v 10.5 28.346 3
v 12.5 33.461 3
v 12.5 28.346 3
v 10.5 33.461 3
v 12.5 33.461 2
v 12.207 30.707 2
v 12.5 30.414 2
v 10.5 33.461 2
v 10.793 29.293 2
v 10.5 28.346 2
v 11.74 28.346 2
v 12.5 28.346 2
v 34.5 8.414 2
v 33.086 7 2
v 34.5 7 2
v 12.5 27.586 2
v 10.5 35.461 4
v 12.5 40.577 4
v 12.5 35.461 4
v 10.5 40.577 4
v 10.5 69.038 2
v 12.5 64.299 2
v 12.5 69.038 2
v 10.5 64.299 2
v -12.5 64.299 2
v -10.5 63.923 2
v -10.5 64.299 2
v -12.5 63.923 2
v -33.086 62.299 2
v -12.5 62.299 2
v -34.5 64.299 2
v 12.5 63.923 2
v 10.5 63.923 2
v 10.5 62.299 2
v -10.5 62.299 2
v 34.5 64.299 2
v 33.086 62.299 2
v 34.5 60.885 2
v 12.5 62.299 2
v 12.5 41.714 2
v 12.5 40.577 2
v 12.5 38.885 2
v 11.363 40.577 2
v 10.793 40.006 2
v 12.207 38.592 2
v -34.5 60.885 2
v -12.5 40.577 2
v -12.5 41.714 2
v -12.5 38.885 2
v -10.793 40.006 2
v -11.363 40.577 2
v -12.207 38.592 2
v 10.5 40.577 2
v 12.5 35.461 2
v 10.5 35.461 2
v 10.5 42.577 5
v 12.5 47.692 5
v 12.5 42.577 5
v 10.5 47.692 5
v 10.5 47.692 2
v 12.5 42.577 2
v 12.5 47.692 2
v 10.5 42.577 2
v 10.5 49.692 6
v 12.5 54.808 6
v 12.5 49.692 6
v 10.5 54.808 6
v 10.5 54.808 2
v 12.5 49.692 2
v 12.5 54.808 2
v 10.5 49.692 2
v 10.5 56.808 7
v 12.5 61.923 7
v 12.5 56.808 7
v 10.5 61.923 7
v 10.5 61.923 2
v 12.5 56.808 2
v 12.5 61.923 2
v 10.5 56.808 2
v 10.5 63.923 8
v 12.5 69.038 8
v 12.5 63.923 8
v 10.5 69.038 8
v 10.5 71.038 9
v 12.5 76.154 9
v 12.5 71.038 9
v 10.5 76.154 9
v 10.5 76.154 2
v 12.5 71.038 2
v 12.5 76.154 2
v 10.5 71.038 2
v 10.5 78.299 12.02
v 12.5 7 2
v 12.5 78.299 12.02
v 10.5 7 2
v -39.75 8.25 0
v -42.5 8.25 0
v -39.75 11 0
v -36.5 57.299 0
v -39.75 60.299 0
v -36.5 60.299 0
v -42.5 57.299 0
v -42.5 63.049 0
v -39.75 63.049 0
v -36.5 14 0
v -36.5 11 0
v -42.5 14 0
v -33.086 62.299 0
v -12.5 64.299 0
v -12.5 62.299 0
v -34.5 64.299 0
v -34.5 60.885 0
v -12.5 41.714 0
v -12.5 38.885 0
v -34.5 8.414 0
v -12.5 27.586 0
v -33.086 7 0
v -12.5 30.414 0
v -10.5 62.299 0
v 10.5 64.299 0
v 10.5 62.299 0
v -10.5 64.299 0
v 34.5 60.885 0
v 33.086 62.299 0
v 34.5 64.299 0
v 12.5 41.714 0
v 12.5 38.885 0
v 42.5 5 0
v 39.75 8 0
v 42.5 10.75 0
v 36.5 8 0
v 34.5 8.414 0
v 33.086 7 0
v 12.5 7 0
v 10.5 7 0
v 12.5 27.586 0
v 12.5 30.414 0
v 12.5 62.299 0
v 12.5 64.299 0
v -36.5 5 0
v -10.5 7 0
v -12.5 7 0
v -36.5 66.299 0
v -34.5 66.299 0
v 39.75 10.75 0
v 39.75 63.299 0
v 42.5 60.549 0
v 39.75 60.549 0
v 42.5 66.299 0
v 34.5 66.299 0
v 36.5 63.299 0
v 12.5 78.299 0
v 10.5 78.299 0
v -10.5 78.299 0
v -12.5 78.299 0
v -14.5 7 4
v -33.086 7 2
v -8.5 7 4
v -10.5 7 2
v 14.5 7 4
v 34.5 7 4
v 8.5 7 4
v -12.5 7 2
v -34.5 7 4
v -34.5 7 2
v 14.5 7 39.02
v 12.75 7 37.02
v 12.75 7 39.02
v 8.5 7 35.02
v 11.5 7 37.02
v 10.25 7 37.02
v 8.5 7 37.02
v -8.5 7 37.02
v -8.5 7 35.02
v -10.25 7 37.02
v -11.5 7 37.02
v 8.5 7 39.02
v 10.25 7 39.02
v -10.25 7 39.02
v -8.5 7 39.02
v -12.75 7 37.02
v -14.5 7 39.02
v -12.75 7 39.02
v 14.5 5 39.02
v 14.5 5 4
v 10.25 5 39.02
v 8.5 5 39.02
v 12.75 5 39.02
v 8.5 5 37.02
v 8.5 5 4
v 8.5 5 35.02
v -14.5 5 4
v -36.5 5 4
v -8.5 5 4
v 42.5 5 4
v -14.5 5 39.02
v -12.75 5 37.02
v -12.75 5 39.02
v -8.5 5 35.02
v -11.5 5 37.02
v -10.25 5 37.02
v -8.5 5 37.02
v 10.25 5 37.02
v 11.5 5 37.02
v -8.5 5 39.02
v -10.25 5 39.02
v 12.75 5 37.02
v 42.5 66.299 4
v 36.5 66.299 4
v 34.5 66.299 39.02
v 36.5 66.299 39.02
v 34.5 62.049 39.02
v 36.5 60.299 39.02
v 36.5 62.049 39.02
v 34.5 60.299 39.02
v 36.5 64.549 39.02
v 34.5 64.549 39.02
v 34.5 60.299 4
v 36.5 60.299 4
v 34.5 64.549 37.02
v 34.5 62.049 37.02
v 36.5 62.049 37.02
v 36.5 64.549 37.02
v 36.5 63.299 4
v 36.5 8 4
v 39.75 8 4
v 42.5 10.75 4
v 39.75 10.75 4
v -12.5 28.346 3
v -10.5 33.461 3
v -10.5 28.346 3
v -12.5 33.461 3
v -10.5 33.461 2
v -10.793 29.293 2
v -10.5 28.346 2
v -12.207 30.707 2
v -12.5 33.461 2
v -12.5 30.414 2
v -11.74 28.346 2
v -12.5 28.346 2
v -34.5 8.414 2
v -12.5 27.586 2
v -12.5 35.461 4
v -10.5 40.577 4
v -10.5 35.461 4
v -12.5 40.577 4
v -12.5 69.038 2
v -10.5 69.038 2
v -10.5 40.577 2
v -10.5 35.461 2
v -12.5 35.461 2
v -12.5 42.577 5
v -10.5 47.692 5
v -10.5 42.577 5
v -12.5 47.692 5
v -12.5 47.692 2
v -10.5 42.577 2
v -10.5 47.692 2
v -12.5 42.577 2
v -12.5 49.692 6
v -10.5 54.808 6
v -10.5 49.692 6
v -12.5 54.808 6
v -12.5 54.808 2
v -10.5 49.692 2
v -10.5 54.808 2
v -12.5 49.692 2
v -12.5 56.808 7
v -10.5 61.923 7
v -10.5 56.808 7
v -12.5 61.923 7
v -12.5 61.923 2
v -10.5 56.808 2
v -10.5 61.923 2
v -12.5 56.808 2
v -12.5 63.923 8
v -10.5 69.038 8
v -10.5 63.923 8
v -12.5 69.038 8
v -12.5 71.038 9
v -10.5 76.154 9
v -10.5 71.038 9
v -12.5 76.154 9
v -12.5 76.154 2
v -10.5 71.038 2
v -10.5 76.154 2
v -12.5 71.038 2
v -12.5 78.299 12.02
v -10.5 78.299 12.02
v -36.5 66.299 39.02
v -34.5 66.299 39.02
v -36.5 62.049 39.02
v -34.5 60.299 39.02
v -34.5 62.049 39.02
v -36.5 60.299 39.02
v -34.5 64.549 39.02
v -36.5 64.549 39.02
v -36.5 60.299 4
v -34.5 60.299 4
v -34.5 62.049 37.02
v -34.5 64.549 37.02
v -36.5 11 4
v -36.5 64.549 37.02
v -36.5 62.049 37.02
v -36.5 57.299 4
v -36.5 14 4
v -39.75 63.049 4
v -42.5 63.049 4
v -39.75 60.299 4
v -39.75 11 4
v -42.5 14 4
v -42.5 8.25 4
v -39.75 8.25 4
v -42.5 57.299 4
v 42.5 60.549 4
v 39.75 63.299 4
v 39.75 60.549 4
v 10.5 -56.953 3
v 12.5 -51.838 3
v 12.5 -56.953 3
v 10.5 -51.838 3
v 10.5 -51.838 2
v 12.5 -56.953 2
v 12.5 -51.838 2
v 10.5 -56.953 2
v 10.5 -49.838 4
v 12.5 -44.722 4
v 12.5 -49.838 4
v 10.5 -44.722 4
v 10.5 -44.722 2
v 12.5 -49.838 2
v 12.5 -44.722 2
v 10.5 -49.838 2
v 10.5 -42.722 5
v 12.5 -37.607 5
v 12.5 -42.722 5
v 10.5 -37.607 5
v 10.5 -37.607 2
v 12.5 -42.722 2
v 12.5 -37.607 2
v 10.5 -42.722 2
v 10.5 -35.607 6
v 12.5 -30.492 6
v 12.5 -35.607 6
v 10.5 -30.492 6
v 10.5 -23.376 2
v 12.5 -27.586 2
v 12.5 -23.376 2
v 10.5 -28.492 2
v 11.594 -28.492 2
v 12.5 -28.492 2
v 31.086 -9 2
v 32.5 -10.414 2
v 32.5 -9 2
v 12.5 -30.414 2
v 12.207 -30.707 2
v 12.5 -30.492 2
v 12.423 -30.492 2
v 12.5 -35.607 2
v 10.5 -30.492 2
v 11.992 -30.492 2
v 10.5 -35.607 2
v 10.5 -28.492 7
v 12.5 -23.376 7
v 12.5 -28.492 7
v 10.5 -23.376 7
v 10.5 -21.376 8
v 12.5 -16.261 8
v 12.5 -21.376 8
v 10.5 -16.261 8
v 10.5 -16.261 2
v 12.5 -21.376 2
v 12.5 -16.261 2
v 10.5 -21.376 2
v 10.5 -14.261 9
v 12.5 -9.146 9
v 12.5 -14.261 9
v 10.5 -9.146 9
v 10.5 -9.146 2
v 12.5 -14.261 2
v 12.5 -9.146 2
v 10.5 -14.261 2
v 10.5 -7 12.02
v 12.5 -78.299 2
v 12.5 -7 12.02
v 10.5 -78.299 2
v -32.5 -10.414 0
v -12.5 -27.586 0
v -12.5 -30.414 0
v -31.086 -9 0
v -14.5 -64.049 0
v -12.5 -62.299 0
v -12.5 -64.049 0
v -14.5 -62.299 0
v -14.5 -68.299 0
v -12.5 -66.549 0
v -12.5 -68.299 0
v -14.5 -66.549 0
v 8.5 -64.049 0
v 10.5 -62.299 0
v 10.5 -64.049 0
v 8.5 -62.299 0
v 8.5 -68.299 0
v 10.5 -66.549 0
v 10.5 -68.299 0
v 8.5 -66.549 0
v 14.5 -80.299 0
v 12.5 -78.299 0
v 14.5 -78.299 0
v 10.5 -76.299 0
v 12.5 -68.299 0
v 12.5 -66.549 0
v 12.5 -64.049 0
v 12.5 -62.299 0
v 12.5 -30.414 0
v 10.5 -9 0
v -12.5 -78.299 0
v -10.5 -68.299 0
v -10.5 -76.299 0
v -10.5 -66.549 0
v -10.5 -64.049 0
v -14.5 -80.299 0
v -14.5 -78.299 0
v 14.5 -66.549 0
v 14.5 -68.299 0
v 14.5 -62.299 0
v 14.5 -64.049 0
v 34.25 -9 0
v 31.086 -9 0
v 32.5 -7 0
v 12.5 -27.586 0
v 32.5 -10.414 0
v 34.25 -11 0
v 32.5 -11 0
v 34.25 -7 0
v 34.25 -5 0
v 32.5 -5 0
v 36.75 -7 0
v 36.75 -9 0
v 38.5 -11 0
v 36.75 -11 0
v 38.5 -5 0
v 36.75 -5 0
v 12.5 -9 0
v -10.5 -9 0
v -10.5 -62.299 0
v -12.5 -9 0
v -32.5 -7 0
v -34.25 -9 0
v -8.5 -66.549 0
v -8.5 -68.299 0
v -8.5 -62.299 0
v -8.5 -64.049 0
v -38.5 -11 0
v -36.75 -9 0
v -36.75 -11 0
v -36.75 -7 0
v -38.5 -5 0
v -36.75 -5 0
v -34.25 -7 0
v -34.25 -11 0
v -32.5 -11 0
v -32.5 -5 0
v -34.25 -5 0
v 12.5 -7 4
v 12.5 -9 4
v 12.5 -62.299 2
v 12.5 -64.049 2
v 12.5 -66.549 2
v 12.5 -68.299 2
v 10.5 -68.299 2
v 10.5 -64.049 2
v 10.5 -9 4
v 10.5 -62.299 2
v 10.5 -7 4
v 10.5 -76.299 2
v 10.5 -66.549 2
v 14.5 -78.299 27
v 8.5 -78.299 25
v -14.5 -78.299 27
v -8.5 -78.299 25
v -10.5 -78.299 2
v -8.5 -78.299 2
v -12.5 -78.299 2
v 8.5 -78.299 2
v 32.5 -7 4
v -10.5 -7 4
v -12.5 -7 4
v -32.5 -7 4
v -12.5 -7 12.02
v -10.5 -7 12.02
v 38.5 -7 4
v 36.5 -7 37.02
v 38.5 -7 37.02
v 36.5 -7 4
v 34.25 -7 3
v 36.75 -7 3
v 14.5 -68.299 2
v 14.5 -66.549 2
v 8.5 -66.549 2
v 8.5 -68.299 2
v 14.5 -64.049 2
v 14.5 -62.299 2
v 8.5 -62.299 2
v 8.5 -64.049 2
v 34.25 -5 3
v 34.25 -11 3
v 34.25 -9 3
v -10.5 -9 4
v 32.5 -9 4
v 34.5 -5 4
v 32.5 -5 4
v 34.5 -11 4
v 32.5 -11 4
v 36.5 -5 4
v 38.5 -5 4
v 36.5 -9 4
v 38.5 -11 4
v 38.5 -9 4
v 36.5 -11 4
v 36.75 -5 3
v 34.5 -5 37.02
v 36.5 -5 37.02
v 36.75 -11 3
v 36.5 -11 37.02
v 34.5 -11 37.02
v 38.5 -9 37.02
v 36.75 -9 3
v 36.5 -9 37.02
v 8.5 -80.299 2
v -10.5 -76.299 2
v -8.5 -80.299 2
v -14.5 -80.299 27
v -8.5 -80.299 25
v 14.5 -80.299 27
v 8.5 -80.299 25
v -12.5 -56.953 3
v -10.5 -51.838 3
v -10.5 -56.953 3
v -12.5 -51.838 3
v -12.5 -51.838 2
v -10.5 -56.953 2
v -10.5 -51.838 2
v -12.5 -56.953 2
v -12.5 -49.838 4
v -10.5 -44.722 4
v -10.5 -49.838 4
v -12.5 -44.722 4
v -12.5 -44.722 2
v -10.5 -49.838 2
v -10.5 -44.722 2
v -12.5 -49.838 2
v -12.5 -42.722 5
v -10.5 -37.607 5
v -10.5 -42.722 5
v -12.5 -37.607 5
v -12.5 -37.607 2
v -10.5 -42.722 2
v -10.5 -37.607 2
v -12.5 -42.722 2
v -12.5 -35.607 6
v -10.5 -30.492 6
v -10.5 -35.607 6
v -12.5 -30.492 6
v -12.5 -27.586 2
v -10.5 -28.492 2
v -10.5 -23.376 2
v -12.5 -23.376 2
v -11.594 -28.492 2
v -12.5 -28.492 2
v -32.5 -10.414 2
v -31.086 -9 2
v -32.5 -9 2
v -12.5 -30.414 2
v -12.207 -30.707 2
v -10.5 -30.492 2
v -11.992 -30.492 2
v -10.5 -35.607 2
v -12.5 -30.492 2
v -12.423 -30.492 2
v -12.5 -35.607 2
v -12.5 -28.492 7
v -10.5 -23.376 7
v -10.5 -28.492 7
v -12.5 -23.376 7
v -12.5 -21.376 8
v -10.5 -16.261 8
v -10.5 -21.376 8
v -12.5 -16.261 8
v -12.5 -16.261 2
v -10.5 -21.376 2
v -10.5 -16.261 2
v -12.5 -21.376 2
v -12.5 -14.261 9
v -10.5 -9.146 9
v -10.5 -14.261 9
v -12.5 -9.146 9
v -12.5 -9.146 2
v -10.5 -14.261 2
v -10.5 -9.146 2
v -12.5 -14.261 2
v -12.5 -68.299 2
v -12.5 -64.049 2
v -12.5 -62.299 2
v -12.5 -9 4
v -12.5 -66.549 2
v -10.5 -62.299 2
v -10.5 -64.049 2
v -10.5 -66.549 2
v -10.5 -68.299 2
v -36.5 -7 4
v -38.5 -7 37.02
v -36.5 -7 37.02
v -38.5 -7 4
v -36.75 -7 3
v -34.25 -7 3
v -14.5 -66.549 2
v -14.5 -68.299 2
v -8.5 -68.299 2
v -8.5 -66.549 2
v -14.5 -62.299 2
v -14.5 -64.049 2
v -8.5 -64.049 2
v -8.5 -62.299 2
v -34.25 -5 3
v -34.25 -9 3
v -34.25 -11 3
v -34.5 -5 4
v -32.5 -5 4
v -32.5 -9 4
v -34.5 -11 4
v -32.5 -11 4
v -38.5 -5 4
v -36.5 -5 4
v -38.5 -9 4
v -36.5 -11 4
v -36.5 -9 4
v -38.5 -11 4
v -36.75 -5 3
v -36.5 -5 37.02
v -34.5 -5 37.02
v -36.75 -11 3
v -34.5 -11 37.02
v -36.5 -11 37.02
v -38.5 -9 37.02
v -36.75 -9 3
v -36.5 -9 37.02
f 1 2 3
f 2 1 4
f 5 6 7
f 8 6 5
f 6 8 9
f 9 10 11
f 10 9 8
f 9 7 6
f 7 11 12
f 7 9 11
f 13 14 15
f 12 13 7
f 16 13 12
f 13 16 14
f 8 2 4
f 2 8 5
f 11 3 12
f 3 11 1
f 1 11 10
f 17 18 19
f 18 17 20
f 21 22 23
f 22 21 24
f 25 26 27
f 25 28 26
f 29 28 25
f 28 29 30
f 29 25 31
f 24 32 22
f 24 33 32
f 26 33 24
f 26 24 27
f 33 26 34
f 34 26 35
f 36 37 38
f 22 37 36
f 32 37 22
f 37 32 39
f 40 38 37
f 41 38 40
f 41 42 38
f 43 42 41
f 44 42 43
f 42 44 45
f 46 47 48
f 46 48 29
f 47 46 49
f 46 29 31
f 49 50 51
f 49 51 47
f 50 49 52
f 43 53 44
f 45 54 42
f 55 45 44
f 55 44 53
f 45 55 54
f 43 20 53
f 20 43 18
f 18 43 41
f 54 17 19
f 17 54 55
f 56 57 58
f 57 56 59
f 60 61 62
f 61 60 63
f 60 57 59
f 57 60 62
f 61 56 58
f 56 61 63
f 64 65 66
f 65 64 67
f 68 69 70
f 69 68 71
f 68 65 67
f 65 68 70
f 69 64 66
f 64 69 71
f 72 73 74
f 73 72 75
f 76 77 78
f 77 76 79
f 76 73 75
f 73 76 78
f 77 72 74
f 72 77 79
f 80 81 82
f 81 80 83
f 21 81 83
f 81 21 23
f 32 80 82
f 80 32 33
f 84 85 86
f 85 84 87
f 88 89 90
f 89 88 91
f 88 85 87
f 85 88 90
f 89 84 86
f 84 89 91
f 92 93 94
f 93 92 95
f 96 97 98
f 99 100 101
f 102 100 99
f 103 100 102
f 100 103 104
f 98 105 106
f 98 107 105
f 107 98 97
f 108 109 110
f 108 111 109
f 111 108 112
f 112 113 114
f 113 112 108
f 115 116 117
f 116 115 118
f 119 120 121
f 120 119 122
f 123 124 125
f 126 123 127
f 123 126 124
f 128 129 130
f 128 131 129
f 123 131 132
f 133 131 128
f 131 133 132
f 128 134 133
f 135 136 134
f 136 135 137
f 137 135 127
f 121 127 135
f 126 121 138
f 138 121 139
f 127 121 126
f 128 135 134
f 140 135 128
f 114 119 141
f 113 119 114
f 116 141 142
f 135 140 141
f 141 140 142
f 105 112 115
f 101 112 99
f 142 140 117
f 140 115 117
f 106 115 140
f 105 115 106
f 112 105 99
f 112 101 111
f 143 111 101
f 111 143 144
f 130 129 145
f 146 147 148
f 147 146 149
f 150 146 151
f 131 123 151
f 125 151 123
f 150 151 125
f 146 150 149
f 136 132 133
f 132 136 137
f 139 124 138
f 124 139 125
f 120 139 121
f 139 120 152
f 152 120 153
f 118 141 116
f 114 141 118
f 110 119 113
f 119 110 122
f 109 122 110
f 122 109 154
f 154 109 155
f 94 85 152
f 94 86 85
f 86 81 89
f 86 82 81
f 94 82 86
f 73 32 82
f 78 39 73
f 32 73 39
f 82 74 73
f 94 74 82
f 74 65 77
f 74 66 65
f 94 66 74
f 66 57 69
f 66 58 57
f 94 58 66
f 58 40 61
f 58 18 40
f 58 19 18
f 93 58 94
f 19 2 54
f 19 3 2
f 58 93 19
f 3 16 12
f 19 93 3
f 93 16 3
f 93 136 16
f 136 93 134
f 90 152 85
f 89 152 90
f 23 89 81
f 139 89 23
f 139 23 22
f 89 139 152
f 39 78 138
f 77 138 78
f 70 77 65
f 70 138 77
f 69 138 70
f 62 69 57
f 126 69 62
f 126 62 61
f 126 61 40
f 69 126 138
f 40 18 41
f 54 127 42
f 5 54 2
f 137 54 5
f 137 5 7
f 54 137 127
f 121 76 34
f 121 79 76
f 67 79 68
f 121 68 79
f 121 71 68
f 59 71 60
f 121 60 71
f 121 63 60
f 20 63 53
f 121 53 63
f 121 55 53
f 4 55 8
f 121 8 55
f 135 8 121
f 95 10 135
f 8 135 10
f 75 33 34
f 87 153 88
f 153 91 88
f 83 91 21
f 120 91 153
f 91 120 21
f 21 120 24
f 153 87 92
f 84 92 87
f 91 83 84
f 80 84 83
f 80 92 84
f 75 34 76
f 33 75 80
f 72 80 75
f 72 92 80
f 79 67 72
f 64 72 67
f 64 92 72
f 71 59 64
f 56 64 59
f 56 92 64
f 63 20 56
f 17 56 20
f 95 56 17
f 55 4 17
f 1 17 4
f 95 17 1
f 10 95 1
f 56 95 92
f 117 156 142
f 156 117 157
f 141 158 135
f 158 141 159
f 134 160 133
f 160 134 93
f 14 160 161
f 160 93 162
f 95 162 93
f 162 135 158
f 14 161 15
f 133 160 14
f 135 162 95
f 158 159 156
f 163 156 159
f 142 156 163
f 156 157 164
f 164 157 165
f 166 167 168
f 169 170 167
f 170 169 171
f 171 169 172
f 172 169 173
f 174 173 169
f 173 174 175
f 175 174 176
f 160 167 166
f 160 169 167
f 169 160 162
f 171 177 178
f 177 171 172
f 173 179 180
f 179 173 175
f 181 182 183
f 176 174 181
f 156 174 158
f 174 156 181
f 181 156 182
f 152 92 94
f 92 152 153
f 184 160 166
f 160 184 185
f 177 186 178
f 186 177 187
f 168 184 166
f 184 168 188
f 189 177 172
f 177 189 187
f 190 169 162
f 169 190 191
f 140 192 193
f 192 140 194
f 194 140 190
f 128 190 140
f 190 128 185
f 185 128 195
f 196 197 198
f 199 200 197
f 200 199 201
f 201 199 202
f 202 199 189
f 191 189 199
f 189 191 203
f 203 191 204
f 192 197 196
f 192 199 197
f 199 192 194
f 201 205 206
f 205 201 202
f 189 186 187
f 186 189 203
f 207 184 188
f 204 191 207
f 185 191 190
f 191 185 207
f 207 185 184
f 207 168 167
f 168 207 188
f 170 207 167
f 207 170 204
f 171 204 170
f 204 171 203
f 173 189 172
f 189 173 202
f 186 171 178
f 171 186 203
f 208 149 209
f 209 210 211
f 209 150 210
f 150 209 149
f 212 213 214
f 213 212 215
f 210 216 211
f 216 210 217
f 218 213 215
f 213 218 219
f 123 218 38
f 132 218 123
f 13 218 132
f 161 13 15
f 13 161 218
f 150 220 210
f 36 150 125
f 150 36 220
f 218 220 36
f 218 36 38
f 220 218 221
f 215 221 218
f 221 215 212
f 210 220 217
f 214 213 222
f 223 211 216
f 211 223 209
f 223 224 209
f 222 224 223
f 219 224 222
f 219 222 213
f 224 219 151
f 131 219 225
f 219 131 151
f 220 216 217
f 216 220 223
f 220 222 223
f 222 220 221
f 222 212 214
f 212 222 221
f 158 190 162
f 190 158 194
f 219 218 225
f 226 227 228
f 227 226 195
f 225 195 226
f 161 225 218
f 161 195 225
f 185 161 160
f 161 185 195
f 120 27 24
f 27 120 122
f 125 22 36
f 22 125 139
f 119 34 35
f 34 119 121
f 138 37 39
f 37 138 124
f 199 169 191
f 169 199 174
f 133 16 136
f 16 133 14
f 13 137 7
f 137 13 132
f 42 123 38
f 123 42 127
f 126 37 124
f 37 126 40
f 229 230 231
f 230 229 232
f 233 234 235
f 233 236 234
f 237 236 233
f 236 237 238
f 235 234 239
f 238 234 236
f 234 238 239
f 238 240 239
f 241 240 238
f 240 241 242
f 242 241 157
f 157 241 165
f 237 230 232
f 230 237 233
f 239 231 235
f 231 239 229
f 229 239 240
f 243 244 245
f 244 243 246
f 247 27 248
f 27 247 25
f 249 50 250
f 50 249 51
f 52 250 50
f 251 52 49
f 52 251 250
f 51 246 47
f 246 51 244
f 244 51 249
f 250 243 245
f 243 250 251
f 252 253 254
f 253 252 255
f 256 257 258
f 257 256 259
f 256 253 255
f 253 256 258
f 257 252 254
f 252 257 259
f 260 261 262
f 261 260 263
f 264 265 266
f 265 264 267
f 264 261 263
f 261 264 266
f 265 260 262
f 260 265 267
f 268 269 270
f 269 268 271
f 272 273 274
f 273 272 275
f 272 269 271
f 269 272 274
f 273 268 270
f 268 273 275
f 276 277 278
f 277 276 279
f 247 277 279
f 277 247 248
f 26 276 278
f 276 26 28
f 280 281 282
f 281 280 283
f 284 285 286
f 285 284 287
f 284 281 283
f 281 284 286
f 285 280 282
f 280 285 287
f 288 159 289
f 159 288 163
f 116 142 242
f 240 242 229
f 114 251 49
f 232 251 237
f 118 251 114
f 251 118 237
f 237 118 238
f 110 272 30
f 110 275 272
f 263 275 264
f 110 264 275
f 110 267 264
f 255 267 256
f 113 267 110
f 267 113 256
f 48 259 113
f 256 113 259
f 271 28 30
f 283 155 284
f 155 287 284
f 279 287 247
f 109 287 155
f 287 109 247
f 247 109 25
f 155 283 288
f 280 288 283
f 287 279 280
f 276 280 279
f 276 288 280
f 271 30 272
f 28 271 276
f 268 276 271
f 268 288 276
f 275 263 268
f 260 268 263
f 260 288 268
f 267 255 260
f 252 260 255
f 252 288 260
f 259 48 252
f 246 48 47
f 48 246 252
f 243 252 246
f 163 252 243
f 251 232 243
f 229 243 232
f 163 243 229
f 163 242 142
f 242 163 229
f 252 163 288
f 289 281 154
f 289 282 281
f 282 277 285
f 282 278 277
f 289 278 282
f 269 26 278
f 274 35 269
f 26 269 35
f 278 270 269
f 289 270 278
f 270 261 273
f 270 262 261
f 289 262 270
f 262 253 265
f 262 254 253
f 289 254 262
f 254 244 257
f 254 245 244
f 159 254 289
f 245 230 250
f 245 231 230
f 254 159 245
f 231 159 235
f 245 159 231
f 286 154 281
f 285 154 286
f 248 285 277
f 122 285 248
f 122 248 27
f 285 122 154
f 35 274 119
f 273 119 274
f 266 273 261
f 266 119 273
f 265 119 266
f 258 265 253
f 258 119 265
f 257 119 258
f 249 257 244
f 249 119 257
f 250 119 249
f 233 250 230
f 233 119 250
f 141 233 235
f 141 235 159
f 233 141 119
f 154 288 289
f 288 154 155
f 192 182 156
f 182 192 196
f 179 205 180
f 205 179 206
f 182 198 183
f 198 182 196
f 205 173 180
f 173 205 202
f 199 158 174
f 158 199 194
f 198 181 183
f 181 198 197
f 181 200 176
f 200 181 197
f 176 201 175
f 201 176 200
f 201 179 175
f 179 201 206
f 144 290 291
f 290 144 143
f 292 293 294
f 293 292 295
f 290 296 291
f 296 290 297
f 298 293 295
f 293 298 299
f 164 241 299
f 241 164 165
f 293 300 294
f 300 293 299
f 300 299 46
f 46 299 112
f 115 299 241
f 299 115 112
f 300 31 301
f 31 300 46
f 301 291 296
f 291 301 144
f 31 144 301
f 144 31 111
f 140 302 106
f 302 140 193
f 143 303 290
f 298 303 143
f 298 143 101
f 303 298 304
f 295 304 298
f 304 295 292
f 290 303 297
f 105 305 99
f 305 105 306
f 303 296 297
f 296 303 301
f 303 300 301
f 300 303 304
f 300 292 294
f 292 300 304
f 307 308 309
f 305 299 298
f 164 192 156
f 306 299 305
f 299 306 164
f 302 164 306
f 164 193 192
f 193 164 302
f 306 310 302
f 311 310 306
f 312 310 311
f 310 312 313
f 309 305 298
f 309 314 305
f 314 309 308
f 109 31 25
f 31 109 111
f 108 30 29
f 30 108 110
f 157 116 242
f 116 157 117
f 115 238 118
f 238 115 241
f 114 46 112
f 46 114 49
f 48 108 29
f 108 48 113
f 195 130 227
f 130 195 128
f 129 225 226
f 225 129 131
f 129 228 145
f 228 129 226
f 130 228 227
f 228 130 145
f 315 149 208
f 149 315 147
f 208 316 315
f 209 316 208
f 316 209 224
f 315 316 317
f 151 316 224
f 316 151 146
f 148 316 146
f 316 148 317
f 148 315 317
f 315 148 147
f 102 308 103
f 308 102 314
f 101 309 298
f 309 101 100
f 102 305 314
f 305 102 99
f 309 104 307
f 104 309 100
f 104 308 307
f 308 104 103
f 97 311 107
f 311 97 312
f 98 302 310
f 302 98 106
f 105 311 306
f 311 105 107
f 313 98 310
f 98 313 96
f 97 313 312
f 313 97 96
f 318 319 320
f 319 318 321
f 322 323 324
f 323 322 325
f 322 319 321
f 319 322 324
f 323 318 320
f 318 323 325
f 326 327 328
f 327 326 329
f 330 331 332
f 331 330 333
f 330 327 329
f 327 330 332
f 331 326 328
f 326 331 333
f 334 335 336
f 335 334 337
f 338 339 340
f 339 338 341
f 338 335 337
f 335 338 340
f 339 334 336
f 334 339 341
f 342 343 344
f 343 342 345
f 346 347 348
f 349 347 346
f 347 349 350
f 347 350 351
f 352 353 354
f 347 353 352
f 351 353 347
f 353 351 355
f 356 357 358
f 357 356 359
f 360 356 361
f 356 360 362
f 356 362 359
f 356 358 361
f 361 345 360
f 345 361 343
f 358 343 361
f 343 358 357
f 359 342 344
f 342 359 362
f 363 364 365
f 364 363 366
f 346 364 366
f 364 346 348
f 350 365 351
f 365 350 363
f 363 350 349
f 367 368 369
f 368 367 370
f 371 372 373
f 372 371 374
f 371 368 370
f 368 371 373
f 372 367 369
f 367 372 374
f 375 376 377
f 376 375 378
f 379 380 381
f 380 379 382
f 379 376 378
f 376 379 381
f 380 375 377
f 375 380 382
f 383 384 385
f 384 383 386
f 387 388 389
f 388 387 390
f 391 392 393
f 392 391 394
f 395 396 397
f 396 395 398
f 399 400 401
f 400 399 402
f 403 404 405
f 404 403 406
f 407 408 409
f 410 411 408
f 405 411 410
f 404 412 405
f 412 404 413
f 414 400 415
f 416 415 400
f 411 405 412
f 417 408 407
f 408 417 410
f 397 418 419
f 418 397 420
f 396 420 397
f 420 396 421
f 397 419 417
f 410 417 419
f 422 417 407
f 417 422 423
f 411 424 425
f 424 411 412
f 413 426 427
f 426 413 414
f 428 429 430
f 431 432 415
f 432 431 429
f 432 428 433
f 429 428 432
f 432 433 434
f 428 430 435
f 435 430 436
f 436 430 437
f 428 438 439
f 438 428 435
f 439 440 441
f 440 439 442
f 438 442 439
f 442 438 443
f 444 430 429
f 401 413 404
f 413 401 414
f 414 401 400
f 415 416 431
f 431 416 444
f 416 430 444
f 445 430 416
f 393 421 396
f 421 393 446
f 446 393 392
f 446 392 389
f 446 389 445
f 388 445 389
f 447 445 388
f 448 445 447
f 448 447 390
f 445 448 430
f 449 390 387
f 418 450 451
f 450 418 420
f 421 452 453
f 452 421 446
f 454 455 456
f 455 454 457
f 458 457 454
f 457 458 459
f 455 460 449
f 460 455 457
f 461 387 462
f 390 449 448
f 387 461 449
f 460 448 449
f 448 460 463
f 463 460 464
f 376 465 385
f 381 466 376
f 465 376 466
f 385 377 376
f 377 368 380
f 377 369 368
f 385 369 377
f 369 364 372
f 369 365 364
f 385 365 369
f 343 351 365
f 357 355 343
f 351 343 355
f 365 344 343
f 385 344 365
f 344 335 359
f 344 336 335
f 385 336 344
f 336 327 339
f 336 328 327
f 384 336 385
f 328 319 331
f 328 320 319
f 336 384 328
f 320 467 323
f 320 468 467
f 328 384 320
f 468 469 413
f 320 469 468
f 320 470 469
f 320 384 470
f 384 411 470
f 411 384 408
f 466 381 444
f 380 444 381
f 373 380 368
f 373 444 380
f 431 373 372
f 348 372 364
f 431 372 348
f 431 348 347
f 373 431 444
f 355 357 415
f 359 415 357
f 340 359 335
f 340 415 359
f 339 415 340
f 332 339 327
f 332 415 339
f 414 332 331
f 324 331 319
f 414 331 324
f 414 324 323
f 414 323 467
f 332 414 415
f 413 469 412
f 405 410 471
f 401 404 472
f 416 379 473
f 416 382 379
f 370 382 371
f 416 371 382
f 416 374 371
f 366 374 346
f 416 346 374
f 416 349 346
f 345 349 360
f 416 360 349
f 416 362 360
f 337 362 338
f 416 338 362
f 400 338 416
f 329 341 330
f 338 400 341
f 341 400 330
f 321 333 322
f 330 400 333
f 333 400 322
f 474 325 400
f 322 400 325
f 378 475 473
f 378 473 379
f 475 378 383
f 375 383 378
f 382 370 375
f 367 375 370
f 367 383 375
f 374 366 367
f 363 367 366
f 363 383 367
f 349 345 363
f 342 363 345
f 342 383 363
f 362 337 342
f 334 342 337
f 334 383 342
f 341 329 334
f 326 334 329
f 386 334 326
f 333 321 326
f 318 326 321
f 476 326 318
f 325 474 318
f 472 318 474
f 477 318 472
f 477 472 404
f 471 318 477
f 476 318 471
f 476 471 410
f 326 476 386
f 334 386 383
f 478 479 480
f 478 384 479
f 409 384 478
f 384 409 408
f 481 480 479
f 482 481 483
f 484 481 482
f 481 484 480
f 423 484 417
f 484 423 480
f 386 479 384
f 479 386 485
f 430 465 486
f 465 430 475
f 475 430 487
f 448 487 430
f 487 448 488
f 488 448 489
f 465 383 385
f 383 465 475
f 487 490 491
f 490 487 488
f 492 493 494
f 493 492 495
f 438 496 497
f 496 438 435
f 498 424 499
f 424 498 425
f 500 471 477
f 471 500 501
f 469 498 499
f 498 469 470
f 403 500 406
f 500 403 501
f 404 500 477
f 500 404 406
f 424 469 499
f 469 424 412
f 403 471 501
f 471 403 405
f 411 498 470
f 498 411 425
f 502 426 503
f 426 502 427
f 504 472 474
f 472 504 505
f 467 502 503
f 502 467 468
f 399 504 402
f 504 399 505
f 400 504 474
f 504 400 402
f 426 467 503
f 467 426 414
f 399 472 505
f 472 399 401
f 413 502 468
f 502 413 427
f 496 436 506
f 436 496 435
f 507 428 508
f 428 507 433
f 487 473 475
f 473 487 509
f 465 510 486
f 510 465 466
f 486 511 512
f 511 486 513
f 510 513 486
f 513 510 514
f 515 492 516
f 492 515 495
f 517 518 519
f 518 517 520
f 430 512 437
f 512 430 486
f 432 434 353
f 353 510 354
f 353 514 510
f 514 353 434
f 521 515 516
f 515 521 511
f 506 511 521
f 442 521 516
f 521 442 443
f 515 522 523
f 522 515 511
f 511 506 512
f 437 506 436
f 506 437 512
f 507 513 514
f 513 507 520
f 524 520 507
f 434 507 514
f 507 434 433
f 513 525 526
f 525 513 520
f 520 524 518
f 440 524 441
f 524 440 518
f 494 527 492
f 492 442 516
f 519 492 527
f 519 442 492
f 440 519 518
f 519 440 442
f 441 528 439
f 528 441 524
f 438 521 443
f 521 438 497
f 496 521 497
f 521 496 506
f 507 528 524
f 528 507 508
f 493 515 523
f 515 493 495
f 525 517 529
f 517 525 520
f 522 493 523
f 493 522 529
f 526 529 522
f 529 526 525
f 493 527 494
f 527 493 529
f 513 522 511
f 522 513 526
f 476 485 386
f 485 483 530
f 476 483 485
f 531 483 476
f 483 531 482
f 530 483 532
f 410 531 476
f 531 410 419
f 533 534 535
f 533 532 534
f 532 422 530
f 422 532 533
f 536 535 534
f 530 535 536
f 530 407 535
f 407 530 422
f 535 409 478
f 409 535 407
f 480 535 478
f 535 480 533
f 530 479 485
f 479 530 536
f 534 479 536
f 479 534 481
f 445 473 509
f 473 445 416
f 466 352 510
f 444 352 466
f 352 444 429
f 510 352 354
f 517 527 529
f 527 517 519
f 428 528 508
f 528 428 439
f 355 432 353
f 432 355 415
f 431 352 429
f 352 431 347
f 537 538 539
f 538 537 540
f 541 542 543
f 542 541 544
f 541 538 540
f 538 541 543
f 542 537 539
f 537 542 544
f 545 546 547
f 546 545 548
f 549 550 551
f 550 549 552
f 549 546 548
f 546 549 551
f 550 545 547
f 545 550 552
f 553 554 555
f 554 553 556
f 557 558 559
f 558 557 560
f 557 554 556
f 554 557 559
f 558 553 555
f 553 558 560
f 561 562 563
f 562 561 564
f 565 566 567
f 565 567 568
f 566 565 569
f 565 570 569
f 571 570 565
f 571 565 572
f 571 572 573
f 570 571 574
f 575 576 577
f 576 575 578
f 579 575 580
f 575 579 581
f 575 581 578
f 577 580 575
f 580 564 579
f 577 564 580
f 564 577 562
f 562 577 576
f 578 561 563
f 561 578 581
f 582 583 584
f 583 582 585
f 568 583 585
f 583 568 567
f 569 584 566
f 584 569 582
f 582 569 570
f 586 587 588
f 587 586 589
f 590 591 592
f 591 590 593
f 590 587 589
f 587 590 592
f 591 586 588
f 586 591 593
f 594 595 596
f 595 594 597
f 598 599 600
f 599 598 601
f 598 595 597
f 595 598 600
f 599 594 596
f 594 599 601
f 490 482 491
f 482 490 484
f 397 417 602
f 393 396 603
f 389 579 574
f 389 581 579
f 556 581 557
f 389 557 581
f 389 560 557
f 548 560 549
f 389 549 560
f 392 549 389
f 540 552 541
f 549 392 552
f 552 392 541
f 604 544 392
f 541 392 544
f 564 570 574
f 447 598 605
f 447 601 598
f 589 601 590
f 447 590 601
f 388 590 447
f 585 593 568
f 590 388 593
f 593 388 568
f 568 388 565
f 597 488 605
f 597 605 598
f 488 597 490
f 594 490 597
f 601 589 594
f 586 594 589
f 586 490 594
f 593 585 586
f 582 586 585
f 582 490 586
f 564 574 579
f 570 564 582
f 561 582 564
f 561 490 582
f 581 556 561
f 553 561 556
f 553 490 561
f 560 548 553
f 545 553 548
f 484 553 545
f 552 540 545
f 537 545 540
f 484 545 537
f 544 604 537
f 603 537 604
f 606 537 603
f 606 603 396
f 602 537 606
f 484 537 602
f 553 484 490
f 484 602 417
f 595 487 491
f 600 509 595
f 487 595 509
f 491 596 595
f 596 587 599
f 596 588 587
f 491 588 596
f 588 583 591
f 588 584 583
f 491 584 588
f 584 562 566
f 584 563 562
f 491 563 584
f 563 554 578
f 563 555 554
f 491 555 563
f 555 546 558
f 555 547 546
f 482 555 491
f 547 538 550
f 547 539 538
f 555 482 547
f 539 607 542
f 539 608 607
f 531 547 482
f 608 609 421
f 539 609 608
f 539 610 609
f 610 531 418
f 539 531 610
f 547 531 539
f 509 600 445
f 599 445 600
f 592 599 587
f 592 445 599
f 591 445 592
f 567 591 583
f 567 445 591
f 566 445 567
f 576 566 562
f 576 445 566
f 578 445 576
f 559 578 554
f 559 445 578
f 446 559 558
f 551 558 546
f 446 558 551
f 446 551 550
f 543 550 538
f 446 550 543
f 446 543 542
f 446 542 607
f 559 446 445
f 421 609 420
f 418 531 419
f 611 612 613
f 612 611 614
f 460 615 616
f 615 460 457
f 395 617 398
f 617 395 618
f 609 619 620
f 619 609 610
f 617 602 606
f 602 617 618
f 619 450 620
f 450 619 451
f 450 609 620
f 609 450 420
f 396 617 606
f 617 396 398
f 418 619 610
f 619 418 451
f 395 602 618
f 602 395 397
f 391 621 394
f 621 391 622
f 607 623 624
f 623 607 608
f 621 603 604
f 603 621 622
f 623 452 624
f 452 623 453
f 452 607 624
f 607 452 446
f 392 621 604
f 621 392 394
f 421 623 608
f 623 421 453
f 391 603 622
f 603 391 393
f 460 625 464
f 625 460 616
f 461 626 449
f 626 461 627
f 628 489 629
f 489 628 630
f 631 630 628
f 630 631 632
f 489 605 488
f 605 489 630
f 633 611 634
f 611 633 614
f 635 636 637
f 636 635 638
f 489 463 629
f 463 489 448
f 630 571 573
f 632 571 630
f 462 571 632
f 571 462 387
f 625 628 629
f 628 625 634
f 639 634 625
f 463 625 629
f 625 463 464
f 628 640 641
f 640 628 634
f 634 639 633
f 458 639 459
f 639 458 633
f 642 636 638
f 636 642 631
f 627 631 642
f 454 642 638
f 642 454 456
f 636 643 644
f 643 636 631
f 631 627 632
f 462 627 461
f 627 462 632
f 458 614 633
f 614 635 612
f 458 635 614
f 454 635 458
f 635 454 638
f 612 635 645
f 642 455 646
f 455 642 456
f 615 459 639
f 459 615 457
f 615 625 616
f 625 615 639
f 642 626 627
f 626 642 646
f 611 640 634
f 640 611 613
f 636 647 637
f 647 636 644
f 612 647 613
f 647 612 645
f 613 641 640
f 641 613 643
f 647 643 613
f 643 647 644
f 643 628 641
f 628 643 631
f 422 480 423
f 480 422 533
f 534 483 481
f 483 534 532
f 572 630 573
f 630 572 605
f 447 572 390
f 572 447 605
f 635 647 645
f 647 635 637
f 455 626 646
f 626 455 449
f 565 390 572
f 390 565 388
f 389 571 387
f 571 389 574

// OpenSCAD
/* [Main] */

// What would you like to generate?
part = "both"; // [base:Base Only,top:Top Only,both:Base and Top]

// Number of holders
holder_count = 1;

// Width of cards to be used (mm)
card_width = 64;

// Length of cards to be used (mm)
card_length = 88;

// Height of holder (approx height of deck) (mm)
holder_height = 25;	// Height of holder

/* [Tweaking] */

// How far back the top layer should be (mm)
top_offset = 14;
// How much the cards overhang the ends of the holder (mm)
overhang = 16;
// The angle of the angled supports (degrees)
angle = 8;
// Gap added to card with to give width of holder (mm)
card_gap = 5;
// Thickness of support bars (mm)
bar_thickness = 2;
// Gap to allow top/bottom to clip together (mm)
support_gap = 0.25;
// Gap to allow clips to clip together (mm)
clip_card_gap = 0.25;
// Distance between top and bottom if printing both (mm)
both_gap = 10;


/****************************************
 *
 ****************************************/

// Internal width of holder
holder_width = card_width + card_gap;
// Length of angled support
angled_length = cos(angle) * (card_length - overhang);;
// Height of angled support
angled_height = (tan(angle) * angled_length) + bar_thickness;
// Length of base (for side bars)
base_length = angled_length - top_offset;
// Full length of base
base_full_length = angled_length + bar_thickness;
// Full length of top
top_full_length = angled_length + (bar_thickness * 2);
// Thickness of clips
clip_thickness = bar_thickness * 1.5;
// Offset of angled support from middle (1/6th from 1/2 = 1/3rd!)
offset = (holder_width) / 6;
// Offset for diagonal bars
diag_offset = sin(45) * bar_thickness;

print_part();

/****************************************
 * Generate the selected part
 ****************************************/
module print_part()
{
	if (part == "base")
	{
		bases();
	} else if (part == "top") {
		tops();
	} else if (part == "both") {
		// translate stuff here...
		translate([0, (base_full_length + both_gap) / 2, 0])
			bases();
		translate([0, -(top_full_length + both_gap) / 2, 0])
			tops();
	}
}

/****************************************
 * Generate the correct number of tops
 ****************************************/
module tops()
{
	// Calculate the full width of the tops
	full_width = (holder_width + bar_thickness) * (holder_count) + (bar_thickness * 3);
	// Centre the tops around zero
	translate([full_width/2, -top_full_length/2, 0])
	{
		// Draw each top
		for(i=[1:holder_count])
		{
			translate([-(holder_width + bar_thickness) * (i-1),0,0])
				singleTop();
		}

		// Thicker bars at ends
		translate([-bar_thickness, angled_length, 0])
		{
			cube([bar_thickness, bar_thickness, holder_height + angled_height]);
		}
		translate([-full_width, angled_length, 0])
		{
			cube([bar_thickness, bar_thickness, holder_height + angled_height]);
		}
	}
}

/****************************************
 * Generate a single top holder
 ****************************************/
module singleTop()
{
	// Length of diagonal bar
	diag_length = 
		(
			(offset*2 - bar_thickness)	// Distance between middle of angled support
												// 	and inside edge of side bar
			+ (diag_offset/2) 				// Distance from inside edge of side bar 
												//		to rotation axis of diagional bar
			+ (bar_thickness-diag_offset)	// Distance from rotation axis 
												//		to centre of diagonal bar
		) / sin(45);

	// Move the holder to start at [0,0,0]
	translate([-holder_width/2-(bar_thickness*2),0,0])
	{
		// As the base is mirrored down the middle, do a side at a time
		for (m=[[0,0,0],[1,0,0]])
		{
			mirror(m)
			{
				// Bar at back
				cube([offset, bar_thickness * 2, bar_thickness]);

				// Support at back
				translate([offset-(bar_thickness * 1.5),0,0])
					cube([bar_thickness * 3, bar_thickness, holder_height + bar_thickness]);
				translate([0,0,holder_height])
					cube([offset, bar_thickness, bar_thickness]);

				// Angled Support
				translate([offset-(bar_thickness * 0.5),bar_thickness,0])
					angledSupport();

				// Notches
				translate([offset-(bar_thickness * 1.5), 0, 0])
				{
					for(s=[
								[0, top_offset - bar_thickness, 0],
								[0, top_offset + bar_thickness + support_gap, 0]
							])
					{
						translate(s)
							cube([bar_thickness * 3, bar_thickness - support_gap, bar_thickness]);
					}
				}

				// Bar at front
				translate([0, angled_length, 0])
					cube([holder_width/2 + (bar_thickness * 2), bar_thickness, bar_thickness * 2]);

				// Front support
				translate([holder_width/2 - bar_thickness, angled_length - bar_thickness, 0])
				{
					for(t=[
							[0, 0, 0],
							[bar_thickness*2 + support_gap, 0, 0]
						])
					{
						translate(t)
							cube([bar_thickness - support_gap, bar_thickness * 3, bar_thickness * 2]);
					}

					translate([0, 0, bar_thickness * 1.5])
						cube([bar_thickness * 3, bar_thickness * 3, bar_thickness * 0.5]);

					// Vertical support
					translate([bar_thickness,0,bar_thickness * 1.5])
					{
						cube([bar_thickness, 
								bar_thickness * 3, 
								holder_height + angled_height - (bar_thickness * 1.5)]);
					}
				}

				// Diagonal supports
				translate([holder_width/2, angled_length + bar_thickness - diag_offset, 0])
					rotate([0,0,135])
						cube([bar_thickness,diag_length,bar_thickness]);
			}
		}
	}	
}

/****************************************
 * Generate the correct number of bases
 ****************************************/
module bases()
{
	// Move bases so generated object is in middle of area
	translate([
			((holder_width * holder_count) + (bar_thickness * (holder_count + 1)))/2,
			-base_full_length/2,
			0])
	{
		// Draw each base
		for(i=[1:holder_count])
		{
			translate([-(holder_width + bar_thickness) * (i-1),0,0])
				singleBase();
		}

		// Add the clips - all mirrored/rotated in their own way

		clip();

		translate([0,base_length + (bar_thickness * 2),0])
			mirror([0,1,0])
				clip();	

		translate([-(holder_width + bar_thickness) * (holder_count) - bar_thickness,
						base_length + (bar_thickness * 2) - (clip_thickness * 3),
						0])
			mirror([1,0,0])
				clip();

		translate([-(holder_width + bar_thickness) * (holder_count) - bar_thickness,
						(clip_thickness * 3),
						0])
			rotate([0,0,180])
				clip();

	}
}

/****************************************
 * Generate a single base
 ****************************************/
module singleBase()
{
	// Length of diagonal bar
	diag_length = 
		(
			(offset*2) 						// Distance between middle of angled support
												// 	and inside edge of side bar
			+ (diag_offset/2) 				// Distance from inside edge of side bar 
												//		to rotation axis of diagional bar
			+ (bar_thickness-diag_offset)	// Distance from rotation axis 
												//		to centre of diagonal bar
		) / sin(45);

	// Move so the base is at [0,0,0]
	translate([-holder_width/2-bar_thickness,0,0])
	{
		// As the base is mirrored down the middle, do a side at a time
		for (m=[[0,0,0],[1,0,0]])
		{
			mirror(m)
			{
				// Bar at back
				cube([holder_width/2, bar_thickness, bar_thickness * 2]);
				// Bar at front
				translate([0,base_length,0])
					cube([holder_width/2, bar_thickness, bar_thickness]);
				// Bar at top of back support
				translate([0,0,holder_height + angled_height - bar_thickness])
					cube([offset, bar_thickness, bar_thickness]);		

				// Side bar
				translate([holder_width/2,0,0])
					cube([bar_thickness, base_length + bar_thickness, bar_thickness * 2]);

				// angled Support
				translate([offset-(bar_thickness * 0.5),bar_thickness,0])
					angledSupport();

				// Back support
				translate([offset-(bar_thickness * 1.5),0,0])
					verticalSupport();
				// Front support
				translate([holder_width/2 + bar_thickness,base_length - bar_thickness,0])
					rotate([0,0,90])
						verticalSupport();

				// Diagonal at back
				translate([holder_width/2 + (bar_thickness - diag_offset), 0, 0])
					rotate([0,0,45])
						cube([bar_thickness,diag_length,bar_thickness]);
				// Diagonal at front
				translate([holder_width/2 + bar_thickness, base_length + bar_thickness - diag_offset, 0])
					rotate([0,0,135])
						cube([bar_thickness,diag_length,bar_thickness]);
			}
		}
	}
}

/****************************************
 * Angled support for cards to sit on
 ****************************************/
module angledSupport()
{
	// Calculate the maximum height of holes
	max_hole = floor(
		((angled_length - (bar_thickness * 2)) * tan(angle))
		- bar_thickness);

	difference()
	{
		// The triangle, with a bar of bar_thickness underneath
		polyhedron(points=[ 
			[0,0,0], [bar_thickness,0,0], 
			[0,angled_length,0], [bar_thickness,angled_length,0],
			[0,angled_length,angled_height], [bar_thickness,angled_length,angled_height],
			[0,0,bar_thickness], [bar_thickness,0,bar_thickness] ],
			// ONLY STILL TRIANGLES FOR THINGIVERSE CUSTOMIZER!
			triangles=[
				[0,1,2], [1,3,2],
				[2,3,5], [2,5,4],
				[4,5,6], [5,7,6],
				[0,6,1], [6,7,1],
				[0,2,6], [2,4,6],
				[3,1,7], [5,3,7]
		]);

		// Step through heights of holes and add them
		if(max_hole>0)
		{
			for (v=[bar_thickness+1:bar_thickness+max_hole])
			{
				translate([-0.1, v/tan(angle), bar_thickness])
					cube([bar_thickness + 0.2, 
							min((v+1)/tan(angle), angled_length)
								-(v/tan(angle))
								-bar_thickness,
							(v-bar_thickness)]);
			}
		}
	}
}

/****************************************
 * A single vertical support for the base (with notches on the top)
 ****************************************/
module verticalSupport()
{
	difference() {
		cube([bar_thickness*3,bar_thickness,holder_height + angled_height + bar_thickness]);
		translate([bar_thickness-support_gap,0,holder_height + angled_height]) {
			cube([bar_thickness+(support_gap * 2),bar_thickness,bar_thickness * 1.1]);
		}
	}
}

/****************************************
 * A single clip, to clip multiple bases together
 ****************************************/
module clip()
{
	translate([-bar_thickness,0,0])
		cube([clip_thickness * 2 + bar_thickness, clip_thickness, bar_thickness * 2]);
	translate([clip_thickness + clip_card_gap, clip_thickness, 0])
		cube([clip_thickness - clip_card_gap, clip_thickness - clip_card_gap, bar_thickness * 2]);
}
